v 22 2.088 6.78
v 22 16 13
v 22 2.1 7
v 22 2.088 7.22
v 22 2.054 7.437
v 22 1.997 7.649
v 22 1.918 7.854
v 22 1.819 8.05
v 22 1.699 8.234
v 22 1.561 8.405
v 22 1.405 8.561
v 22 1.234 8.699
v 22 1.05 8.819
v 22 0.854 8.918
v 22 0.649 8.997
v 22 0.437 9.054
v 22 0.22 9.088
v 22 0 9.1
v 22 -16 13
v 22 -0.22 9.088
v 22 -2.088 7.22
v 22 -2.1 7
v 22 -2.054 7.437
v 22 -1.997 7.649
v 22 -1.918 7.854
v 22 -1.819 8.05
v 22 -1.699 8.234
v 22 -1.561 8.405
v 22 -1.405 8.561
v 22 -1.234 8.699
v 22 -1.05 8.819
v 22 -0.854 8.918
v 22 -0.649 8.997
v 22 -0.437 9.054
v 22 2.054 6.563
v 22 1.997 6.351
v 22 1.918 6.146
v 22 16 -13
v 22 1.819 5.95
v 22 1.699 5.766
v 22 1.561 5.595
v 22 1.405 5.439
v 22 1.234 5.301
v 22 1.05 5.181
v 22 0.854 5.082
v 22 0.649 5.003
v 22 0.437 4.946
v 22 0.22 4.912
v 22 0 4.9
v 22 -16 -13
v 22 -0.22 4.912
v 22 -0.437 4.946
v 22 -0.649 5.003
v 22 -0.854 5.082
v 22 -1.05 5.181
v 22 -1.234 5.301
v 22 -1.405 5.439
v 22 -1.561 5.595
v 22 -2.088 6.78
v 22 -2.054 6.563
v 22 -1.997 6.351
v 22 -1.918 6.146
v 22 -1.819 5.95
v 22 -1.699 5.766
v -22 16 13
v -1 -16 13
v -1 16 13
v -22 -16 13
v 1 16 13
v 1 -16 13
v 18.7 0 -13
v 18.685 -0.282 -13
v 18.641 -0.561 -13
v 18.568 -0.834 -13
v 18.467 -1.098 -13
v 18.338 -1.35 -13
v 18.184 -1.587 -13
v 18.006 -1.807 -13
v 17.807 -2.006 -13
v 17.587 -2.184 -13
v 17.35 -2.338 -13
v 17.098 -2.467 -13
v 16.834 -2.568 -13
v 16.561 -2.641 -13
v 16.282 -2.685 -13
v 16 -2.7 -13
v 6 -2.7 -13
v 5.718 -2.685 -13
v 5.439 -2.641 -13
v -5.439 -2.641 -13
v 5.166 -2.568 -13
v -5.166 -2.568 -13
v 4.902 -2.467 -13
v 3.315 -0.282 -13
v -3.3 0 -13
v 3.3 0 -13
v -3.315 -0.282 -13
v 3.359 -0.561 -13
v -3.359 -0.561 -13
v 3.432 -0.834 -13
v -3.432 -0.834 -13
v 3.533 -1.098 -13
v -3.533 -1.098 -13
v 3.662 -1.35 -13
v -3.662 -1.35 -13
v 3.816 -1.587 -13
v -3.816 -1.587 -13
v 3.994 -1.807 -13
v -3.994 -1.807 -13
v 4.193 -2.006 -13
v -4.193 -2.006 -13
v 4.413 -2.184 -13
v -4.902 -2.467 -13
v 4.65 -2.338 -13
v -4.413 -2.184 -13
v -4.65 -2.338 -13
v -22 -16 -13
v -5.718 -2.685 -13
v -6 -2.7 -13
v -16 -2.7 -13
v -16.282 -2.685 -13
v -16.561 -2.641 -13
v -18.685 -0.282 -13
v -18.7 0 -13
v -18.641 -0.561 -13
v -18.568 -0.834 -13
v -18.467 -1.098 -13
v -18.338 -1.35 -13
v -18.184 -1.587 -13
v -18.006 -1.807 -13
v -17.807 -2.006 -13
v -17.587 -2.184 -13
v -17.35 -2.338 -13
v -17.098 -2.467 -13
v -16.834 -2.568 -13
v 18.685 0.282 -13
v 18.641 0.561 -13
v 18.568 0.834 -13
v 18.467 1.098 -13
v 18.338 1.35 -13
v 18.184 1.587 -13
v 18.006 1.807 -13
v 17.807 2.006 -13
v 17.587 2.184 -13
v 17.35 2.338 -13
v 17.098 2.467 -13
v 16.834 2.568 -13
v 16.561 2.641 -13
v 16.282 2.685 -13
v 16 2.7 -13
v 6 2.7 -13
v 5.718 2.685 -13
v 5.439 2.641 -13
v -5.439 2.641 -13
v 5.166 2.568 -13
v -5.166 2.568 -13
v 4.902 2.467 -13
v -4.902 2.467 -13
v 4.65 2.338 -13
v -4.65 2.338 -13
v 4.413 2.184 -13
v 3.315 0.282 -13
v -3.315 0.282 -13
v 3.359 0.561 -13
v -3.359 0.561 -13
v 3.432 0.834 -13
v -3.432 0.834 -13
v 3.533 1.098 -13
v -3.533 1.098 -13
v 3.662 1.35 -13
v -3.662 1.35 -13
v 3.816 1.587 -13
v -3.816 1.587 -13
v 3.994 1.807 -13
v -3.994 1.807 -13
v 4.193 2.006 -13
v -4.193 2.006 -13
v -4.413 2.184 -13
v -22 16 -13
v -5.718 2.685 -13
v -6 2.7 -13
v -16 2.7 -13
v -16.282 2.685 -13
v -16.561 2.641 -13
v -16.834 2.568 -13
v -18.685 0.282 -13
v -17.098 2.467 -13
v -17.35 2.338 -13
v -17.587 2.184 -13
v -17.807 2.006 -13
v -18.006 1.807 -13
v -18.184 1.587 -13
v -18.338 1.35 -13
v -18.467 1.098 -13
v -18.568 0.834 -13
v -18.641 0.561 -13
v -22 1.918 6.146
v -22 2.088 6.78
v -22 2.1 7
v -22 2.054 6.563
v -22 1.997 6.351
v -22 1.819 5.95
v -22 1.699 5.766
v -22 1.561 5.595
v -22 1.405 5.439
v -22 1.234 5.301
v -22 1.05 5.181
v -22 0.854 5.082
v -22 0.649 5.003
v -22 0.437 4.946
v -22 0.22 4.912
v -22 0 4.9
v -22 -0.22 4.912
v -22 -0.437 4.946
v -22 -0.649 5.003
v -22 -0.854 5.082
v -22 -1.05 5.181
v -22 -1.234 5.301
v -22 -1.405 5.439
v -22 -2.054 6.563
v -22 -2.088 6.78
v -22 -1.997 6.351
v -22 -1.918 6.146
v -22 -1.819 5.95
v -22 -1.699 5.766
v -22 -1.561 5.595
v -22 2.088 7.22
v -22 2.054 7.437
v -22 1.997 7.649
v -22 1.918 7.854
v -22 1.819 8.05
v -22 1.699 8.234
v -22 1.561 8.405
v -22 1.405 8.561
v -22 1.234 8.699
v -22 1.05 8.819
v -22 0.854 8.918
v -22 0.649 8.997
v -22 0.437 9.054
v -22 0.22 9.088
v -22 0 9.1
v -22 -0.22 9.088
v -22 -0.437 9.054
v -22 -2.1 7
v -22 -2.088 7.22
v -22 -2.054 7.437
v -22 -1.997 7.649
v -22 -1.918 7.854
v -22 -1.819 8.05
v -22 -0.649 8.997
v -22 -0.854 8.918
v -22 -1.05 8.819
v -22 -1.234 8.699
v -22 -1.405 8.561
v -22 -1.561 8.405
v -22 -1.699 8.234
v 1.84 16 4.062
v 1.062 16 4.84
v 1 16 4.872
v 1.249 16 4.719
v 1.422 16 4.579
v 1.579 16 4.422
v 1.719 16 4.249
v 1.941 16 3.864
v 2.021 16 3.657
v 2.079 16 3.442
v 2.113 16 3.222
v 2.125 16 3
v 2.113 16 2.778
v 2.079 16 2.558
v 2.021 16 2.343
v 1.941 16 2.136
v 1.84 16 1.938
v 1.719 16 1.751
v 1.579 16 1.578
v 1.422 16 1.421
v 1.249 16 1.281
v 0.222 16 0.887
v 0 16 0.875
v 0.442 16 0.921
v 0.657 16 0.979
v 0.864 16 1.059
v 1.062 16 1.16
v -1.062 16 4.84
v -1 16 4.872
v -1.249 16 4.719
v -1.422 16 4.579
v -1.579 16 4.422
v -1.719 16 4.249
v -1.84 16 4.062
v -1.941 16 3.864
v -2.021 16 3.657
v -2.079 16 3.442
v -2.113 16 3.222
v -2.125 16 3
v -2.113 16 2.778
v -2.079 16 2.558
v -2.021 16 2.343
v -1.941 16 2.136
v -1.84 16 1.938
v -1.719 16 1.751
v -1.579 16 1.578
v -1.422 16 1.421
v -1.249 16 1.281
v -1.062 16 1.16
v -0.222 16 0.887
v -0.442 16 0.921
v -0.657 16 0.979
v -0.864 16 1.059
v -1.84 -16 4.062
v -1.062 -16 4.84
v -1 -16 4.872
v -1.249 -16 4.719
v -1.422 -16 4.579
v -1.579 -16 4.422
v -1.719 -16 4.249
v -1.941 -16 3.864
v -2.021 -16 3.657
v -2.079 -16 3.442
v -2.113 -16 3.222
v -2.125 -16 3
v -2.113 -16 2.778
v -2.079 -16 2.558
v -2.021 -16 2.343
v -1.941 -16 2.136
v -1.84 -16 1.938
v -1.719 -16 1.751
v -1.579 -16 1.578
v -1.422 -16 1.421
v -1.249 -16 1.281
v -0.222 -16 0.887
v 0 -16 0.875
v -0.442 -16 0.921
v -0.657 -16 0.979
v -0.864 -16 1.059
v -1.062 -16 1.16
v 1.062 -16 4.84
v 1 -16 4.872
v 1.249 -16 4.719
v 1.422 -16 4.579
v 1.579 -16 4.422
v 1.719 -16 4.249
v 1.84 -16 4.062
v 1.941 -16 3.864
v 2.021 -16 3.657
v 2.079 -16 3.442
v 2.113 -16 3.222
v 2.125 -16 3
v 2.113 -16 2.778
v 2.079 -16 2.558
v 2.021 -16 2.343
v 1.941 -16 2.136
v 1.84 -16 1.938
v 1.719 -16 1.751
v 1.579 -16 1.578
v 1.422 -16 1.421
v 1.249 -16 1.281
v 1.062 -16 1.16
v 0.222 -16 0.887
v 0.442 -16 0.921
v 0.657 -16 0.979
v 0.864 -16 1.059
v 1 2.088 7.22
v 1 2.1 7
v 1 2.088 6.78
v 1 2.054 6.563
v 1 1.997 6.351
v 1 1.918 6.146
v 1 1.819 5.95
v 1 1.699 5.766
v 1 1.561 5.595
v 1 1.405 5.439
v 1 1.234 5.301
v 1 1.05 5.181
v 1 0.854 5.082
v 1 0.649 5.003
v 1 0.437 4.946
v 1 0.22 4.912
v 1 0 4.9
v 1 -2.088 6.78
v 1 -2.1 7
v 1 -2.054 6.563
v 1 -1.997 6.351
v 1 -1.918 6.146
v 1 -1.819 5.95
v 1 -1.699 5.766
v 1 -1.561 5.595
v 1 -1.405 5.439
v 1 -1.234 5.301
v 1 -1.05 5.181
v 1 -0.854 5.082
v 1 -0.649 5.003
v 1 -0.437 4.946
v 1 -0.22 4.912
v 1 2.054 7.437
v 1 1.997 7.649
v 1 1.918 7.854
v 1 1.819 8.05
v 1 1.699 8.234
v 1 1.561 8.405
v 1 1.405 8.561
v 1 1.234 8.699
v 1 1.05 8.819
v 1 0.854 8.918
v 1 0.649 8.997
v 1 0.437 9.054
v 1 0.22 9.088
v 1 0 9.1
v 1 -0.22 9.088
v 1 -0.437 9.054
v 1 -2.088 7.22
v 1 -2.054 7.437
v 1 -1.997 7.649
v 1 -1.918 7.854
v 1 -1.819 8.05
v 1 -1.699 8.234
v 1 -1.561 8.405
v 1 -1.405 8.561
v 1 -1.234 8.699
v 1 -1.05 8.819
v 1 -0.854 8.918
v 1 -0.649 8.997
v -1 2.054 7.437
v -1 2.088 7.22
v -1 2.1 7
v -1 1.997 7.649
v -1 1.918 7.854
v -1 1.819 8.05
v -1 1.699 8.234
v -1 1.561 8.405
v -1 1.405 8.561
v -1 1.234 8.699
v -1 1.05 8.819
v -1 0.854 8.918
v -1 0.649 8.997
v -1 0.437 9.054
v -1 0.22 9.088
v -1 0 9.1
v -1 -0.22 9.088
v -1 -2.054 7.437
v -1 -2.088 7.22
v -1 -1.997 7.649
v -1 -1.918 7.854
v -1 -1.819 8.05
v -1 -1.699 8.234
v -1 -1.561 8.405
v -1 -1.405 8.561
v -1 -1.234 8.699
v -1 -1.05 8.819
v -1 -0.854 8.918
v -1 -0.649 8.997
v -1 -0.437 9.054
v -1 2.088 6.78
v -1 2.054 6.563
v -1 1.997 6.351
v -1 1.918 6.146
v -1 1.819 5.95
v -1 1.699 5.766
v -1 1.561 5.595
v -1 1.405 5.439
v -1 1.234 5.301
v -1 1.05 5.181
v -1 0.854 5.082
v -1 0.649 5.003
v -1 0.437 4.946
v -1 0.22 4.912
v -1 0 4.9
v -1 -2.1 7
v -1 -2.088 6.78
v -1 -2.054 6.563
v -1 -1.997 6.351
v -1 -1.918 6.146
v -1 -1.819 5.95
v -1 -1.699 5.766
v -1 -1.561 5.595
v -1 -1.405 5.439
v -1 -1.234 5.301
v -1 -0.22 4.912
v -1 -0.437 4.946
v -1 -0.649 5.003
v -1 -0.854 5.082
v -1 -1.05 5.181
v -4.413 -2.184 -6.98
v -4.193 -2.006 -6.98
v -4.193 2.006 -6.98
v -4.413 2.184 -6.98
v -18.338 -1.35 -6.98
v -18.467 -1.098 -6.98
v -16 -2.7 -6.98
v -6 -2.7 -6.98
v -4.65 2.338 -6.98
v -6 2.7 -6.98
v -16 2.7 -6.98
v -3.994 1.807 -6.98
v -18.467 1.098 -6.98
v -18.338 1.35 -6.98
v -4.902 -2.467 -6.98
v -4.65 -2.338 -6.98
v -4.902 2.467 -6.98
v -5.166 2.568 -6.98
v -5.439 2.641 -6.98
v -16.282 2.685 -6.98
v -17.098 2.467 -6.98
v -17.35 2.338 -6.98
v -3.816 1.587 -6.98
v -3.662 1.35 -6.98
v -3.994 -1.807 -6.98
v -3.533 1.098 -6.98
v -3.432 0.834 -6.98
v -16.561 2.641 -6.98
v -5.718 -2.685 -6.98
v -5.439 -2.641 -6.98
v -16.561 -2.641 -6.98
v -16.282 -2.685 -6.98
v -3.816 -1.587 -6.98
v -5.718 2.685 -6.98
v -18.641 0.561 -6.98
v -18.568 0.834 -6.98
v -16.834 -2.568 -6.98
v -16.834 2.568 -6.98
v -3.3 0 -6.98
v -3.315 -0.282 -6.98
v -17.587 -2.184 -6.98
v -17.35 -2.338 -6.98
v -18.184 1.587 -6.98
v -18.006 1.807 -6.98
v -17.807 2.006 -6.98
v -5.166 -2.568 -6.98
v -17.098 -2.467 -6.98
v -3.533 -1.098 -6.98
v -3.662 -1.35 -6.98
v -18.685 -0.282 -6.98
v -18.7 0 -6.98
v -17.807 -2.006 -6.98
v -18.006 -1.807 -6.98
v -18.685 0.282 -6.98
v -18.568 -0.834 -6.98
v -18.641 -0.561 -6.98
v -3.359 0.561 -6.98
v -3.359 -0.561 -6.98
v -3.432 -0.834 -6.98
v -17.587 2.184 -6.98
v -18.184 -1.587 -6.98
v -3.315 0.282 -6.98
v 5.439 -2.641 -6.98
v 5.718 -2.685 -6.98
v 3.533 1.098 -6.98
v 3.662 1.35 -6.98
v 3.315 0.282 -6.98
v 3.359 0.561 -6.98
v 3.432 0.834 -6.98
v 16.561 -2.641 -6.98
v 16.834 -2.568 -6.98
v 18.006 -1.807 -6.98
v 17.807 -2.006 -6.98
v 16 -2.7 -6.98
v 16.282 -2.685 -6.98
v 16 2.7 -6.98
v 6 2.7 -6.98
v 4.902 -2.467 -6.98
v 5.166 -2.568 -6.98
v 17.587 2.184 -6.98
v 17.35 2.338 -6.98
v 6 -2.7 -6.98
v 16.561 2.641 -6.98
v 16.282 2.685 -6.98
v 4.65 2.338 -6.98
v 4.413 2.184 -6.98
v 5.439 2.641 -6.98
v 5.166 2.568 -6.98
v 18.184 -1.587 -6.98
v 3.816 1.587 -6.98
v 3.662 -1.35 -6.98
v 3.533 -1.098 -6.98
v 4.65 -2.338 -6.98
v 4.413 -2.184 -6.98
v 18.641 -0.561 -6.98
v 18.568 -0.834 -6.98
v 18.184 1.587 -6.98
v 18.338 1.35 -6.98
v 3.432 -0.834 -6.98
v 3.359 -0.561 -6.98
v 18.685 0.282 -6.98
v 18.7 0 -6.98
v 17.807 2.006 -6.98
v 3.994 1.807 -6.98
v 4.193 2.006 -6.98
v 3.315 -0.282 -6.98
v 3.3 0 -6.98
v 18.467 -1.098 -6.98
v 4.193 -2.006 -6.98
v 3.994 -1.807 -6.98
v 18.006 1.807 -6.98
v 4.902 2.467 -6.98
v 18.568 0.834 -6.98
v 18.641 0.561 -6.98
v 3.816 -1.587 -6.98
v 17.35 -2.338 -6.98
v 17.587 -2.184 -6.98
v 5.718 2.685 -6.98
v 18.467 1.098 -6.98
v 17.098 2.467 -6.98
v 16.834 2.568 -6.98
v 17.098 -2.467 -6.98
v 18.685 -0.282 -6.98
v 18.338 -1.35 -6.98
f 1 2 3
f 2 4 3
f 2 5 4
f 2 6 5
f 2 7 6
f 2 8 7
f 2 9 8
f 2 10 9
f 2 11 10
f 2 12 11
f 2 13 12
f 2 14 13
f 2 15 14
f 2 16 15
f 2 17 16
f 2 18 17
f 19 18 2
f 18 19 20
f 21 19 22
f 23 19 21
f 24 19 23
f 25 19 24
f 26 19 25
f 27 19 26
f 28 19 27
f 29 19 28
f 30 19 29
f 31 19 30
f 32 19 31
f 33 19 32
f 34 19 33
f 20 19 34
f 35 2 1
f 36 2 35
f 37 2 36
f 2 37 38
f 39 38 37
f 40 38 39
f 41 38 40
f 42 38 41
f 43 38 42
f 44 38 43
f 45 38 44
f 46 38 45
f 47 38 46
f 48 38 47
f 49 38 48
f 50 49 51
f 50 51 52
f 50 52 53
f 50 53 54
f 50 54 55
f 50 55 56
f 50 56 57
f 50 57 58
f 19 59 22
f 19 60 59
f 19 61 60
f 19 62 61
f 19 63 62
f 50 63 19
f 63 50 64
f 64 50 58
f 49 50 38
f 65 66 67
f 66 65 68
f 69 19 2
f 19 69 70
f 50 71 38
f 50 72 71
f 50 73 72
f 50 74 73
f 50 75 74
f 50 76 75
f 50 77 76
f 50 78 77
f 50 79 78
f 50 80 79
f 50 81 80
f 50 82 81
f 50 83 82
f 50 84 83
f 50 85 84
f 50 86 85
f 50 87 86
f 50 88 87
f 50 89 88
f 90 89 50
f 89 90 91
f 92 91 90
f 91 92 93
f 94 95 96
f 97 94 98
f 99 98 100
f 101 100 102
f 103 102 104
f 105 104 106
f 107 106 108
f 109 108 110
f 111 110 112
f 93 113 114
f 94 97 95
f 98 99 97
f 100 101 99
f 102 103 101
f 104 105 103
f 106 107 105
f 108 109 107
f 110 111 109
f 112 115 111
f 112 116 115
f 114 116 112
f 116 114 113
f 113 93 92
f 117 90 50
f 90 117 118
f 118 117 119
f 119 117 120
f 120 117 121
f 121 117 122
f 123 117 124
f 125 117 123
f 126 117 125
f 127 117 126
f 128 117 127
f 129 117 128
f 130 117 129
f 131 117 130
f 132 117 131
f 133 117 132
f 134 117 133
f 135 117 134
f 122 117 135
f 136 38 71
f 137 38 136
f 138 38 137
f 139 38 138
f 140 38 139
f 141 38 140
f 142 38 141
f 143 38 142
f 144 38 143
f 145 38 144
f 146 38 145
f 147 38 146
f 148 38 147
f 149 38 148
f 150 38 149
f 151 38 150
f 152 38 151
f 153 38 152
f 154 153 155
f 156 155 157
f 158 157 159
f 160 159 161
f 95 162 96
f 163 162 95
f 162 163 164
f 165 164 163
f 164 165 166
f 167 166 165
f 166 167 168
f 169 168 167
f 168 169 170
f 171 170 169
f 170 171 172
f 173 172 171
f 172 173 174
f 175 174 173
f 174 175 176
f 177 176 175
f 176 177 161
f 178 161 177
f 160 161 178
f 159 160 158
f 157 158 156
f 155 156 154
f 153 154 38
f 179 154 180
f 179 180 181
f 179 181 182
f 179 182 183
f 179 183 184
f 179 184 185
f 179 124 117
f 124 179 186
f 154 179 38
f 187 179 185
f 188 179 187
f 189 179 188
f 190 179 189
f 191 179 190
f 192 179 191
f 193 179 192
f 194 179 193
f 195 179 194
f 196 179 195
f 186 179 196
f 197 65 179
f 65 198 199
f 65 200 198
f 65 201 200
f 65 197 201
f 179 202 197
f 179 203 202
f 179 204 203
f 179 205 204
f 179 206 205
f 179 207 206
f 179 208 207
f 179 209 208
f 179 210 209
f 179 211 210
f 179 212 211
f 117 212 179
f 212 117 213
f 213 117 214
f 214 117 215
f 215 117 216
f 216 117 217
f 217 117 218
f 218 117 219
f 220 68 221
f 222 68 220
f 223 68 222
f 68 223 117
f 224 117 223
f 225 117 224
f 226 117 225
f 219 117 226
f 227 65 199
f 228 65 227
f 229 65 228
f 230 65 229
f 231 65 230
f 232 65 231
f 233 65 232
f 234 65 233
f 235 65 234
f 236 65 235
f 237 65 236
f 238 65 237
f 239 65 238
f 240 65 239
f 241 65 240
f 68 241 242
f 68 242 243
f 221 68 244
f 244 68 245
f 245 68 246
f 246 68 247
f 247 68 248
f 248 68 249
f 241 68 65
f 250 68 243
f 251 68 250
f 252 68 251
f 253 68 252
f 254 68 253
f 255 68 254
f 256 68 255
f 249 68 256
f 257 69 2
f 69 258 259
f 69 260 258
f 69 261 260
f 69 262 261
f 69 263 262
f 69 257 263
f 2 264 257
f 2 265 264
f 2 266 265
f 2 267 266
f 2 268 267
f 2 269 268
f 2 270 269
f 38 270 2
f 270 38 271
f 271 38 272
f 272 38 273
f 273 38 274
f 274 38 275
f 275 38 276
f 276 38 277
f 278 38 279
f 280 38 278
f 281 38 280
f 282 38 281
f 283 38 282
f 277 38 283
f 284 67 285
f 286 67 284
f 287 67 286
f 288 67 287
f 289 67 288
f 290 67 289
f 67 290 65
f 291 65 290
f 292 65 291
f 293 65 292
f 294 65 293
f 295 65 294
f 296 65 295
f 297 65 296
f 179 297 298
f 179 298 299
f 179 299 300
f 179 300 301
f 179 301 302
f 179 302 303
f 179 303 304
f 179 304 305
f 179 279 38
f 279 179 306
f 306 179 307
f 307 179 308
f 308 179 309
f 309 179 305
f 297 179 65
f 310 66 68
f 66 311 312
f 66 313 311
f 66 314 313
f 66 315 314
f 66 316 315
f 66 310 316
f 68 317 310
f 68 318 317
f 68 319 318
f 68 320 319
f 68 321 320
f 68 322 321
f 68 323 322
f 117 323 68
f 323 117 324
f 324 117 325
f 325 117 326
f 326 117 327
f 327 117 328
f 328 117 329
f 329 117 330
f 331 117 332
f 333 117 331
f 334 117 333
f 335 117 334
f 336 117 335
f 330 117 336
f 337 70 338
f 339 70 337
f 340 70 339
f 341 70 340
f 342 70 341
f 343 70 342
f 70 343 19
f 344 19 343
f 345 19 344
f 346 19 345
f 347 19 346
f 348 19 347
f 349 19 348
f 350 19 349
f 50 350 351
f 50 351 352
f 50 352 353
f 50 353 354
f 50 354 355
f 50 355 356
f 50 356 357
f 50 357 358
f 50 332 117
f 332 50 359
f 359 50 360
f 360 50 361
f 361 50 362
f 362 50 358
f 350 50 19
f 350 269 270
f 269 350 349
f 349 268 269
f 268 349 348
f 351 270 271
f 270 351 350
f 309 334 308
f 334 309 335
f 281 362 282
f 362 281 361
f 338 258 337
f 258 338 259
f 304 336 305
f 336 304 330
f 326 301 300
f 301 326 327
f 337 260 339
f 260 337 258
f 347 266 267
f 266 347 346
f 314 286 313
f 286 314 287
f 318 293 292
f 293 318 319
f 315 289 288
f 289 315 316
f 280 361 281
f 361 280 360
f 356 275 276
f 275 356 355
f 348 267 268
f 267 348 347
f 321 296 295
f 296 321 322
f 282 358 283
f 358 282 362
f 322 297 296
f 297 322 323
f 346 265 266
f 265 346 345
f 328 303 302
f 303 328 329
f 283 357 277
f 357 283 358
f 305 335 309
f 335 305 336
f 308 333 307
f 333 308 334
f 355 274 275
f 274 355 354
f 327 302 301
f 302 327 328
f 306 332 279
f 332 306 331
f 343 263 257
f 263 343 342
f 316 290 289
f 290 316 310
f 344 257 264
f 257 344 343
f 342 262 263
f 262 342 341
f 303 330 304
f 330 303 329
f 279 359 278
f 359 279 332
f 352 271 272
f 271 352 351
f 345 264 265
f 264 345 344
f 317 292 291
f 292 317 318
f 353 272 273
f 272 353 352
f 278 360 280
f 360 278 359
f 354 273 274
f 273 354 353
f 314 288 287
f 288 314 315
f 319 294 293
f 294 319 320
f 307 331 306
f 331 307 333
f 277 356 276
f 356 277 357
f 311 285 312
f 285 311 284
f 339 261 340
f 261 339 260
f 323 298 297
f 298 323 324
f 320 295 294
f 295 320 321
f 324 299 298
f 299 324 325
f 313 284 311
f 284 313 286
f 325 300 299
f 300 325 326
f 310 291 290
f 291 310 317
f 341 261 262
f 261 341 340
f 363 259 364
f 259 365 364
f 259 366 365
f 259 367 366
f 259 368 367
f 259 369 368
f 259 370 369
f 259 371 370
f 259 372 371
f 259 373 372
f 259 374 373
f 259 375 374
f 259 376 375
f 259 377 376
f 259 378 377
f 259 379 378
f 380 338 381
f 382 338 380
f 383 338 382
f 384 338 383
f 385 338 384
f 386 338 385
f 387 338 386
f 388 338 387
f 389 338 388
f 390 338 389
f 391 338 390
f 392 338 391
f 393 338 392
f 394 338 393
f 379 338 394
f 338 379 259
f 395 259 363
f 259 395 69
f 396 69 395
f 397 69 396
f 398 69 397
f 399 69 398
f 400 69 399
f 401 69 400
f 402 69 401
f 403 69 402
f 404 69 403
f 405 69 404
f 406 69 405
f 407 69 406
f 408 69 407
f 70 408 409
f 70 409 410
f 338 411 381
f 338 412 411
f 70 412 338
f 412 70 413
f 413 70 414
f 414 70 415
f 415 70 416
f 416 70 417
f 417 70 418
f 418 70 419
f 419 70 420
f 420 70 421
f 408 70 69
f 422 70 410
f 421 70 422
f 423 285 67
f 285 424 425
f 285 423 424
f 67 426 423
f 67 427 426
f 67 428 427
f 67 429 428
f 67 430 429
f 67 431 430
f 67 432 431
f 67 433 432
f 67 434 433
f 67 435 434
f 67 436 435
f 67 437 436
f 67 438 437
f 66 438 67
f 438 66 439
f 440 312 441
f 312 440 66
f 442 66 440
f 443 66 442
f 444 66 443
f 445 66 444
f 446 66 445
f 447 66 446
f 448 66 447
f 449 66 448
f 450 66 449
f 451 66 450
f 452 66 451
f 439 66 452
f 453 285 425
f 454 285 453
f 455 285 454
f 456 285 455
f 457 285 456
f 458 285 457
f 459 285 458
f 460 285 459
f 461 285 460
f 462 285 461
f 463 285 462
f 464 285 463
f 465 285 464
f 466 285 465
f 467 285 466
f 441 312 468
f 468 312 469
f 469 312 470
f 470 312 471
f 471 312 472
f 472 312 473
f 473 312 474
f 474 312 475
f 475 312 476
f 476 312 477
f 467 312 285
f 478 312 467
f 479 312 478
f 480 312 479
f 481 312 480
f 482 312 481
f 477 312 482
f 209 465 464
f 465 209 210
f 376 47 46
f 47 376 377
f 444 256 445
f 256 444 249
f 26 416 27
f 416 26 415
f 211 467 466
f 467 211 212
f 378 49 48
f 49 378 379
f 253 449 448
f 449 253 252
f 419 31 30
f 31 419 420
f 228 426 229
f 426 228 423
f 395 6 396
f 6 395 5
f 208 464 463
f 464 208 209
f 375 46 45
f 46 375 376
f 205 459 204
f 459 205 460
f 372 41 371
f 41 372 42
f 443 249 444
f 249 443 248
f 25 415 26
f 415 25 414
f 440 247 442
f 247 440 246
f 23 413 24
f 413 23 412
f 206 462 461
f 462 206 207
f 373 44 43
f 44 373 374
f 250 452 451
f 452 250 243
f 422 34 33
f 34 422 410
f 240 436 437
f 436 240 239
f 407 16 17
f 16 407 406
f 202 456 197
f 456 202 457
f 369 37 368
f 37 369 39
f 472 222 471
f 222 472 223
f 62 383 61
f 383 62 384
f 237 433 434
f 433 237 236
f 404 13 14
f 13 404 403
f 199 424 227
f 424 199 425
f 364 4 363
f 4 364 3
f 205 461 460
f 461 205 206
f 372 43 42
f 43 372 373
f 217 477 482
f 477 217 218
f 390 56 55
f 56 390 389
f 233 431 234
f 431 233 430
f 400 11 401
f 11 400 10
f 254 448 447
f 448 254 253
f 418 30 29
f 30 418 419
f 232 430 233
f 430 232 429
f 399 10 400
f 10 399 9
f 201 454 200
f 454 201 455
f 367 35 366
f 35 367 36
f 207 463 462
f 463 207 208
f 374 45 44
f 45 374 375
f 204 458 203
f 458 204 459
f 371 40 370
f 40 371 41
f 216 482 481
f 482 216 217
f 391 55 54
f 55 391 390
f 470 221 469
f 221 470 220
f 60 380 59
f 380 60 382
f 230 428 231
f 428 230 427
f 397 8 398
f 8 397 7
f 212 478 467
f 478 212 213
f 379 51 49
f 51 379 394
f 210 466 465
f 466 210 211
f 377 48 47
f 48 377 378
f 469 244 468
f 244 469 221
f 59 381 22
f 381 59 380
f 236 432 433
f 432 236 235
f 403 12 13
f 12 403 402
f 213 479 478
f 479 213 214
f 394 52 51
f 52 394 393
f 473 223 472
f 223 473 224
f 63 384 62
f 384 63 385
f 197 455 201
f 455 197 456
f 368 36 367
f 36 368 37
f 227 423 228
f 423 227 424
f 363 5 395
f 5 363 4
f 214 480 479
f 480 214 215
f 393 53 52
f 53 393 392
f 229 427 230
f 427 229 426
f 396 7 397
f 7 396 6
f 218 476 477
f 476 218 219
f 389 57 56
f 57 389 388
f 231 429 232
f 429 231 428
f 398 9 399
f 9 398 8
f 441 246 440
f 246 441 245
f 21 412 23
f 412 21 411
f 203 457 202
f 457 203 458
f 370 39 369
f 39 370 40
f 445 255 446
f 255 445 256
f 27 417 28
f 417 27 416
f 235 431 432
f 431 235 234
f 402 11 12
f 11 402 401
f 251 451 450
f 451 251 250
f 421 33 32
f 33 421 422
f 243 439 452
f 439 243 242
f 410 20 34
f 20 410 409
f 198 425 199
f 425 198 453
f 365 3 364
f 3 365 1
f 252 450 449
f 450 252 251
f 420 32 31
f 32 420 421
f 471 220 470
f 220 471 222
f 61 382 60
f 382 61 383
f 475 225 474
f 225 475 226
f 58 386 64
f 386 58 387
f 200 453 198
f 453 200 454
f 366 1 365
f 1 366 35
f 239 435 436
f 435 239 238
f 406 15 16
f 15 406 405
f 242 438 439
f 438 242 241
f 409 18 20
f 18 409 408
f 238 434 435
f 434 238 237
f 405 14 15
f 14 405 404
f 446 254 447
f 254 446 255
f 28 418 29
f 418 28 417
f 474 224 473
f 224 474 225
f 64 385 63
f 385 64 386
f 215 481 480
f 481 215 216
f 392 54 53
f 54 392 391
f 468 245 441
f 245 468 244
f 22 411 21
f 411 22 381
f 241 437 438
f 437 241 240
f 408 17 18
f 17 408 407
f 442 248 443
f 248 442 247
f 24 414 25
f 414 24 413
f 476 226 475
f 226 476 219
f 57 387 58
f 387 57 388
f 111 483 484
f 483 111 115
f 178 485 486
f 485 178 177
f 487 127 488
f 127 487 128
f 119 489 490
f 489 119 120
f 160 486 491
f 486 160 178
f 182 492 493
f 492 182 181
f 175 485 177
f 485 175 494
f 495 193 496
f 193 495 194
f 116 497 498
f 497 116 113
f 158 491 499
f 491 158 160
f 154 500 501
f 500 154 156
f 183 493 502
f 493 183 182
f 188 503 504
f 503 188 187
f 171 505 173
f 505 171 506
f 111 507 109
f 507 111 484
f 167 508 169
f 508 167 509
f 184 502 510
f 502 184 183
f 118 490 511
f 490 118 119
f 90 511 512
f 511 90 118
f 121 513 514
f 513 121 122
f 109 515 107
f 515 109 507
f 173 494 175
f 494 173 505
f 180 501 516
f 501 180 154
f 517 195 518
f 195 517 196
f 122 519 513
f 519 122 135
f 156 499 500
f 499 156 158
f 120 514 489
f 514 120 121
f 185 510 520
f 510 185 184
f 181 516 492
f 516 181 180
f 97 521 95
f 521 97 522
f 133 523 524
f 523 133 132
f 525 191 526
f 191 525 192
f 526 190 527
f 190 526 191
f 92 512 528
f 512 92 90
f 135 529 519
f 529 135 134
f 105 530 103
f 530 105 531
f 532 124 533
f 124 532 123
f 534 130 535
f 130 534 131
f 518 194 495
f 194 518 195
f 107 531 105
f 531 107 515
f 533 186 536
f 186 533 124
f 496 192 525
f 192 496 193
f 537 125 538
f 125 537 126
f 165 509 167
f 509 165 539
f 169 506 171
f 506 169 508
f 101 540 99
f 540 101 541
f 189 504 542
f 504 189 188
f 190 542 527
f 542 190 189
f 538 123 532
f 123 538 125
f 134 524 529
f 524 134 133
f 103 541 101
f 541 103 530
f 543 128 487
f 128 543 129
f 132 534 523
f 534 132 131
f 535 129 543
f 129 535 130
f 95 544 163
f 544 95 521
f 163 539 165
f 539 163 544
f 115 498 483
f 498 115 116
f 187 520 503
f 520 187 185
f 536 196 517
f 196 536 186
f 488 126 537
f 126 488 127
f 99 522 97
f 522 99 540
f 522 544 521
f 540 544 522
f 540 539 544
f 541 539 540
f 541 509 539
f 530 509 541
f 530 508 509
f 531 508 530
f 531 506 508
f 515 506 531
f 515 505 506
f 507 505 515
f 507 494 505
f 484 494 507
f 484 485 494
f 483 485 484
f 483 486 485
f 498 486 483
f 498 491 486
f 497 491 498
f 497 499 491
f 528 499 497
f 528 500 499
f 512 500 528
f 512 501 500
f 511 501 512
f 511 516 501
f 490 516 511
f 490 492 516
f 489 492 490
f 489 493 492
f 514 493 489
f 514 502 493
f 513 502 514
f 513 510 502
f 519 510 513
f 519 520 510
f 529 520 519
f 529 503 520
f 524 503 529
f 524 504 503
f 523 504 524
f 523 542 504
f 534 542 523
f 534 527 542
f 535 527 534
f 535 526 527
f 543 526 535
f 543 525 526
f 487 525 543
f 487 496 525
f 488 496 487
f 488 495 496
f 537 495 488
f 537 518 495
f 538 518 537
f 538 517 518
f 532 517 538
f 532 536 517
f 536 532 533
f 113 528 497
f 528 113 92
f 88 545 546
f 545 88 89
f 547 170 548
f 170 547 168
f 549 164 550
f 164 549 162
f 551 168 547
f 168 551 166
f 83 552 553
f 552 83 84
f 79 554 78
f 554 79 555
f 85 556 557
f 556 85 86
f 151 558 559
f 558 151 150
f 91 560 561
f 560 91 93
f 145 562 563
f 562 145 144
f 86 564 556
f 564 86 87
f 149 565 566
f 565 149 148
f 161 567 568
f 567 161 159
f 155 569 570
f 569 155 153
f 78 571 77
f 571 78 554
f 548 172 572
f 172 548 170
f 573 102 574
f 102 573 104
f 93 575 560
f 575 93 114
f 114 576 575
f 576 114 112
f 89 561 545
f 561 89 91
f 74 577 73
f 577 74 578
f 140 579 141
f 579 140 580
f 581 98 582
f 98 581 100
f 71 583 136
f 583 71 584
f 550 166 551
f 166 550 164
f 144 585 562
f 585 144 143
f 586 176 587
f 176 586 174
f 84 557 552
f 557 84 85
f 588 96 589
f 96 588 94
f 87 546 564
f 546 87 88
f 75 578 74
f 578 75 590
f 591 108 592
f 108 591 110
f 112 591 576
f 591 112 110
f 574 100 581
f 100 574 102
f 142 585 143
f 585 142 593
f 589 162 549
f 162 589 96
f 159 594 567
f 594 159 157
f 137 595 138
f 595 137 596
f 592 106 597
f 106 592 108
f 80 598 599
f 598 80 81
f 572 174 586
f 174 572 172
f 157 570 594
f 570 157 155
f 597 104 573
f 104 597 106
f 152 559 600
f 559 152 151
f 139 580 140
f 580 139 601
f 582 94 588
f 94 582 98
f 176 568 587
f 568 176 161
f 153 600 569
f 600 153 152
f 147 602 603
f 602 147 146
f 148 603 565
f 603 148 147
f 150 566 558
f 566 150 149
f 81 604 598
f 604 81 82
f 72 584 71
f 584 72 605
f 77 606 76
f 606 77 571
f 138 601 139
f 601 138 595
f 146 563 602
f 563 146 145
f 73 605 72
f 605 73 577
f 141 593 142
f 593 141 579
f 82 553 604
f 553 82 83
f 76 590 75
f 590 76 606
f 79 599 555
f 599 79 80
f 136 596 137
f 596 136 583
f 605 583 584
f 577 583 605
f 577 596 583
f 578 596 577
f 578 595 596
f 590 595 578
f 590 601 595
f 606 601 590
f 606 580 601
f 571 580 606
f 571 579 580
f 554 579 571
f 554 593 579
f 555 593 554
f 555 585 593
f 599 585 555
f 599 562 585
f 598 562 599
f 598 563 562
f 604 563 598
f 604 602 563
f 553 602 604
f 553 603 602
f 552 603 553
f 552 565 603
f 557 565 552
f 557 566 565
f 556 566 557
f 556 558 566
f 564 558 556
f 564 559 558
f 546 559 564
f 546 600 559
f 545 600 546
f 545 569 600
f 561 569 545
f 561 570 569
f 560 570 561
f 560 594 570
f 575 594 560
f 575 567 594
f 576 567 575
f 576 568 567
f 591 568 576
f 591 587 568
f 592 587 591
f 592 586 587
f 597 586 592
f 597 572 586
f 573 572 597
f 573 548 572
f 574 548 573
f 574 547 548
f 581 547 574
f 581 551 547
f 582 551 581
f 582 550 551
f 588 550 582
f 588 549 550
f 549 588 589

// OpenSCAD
// Clamp pedestal for 4 mm shaft.
$fn = 60;
eps = 0.02;
shaft_d = 4;
body_l = 44;
body_d = 32;
body_h = 26;
base_t = 6;
slot_w = 2;
mount_d = 5.4;
module mount_slot(x) {
    hull() {
        translate([x - 5, 0, -body_h / 2 - eps]) cylinder(d = mount_d, h = base_t + 2 * eps);
        translate([x + 5, 0, -body_h / 2 - eps]) cylinder(d = mount_d, h = base_t + 2 * eps);
    }
}
difference() {
    cube([body_l, body_d, body_h], center = true);
    translate([0, -body_d / 2 - eps, 3]) rotate([-90, 0, 0]) cylinder(d = shaft_d + 0.25, h = body_d + 2 * eps);
    translate([-slot_w / 2, -body_d / 2 - eps, 3]) cube([slot_w, body_d + 2 * eps, body_h / 2 + eps]);
    translate([-body_l / 2 - eps, 0, body_h / 2 - 6]) rotate([0, 90, 0]) cylinder(d = 4.2, h = body_l + 2 * eps);
    mount_slot(-body_l / 4);
    mount_slot(body_l / 4);
}
